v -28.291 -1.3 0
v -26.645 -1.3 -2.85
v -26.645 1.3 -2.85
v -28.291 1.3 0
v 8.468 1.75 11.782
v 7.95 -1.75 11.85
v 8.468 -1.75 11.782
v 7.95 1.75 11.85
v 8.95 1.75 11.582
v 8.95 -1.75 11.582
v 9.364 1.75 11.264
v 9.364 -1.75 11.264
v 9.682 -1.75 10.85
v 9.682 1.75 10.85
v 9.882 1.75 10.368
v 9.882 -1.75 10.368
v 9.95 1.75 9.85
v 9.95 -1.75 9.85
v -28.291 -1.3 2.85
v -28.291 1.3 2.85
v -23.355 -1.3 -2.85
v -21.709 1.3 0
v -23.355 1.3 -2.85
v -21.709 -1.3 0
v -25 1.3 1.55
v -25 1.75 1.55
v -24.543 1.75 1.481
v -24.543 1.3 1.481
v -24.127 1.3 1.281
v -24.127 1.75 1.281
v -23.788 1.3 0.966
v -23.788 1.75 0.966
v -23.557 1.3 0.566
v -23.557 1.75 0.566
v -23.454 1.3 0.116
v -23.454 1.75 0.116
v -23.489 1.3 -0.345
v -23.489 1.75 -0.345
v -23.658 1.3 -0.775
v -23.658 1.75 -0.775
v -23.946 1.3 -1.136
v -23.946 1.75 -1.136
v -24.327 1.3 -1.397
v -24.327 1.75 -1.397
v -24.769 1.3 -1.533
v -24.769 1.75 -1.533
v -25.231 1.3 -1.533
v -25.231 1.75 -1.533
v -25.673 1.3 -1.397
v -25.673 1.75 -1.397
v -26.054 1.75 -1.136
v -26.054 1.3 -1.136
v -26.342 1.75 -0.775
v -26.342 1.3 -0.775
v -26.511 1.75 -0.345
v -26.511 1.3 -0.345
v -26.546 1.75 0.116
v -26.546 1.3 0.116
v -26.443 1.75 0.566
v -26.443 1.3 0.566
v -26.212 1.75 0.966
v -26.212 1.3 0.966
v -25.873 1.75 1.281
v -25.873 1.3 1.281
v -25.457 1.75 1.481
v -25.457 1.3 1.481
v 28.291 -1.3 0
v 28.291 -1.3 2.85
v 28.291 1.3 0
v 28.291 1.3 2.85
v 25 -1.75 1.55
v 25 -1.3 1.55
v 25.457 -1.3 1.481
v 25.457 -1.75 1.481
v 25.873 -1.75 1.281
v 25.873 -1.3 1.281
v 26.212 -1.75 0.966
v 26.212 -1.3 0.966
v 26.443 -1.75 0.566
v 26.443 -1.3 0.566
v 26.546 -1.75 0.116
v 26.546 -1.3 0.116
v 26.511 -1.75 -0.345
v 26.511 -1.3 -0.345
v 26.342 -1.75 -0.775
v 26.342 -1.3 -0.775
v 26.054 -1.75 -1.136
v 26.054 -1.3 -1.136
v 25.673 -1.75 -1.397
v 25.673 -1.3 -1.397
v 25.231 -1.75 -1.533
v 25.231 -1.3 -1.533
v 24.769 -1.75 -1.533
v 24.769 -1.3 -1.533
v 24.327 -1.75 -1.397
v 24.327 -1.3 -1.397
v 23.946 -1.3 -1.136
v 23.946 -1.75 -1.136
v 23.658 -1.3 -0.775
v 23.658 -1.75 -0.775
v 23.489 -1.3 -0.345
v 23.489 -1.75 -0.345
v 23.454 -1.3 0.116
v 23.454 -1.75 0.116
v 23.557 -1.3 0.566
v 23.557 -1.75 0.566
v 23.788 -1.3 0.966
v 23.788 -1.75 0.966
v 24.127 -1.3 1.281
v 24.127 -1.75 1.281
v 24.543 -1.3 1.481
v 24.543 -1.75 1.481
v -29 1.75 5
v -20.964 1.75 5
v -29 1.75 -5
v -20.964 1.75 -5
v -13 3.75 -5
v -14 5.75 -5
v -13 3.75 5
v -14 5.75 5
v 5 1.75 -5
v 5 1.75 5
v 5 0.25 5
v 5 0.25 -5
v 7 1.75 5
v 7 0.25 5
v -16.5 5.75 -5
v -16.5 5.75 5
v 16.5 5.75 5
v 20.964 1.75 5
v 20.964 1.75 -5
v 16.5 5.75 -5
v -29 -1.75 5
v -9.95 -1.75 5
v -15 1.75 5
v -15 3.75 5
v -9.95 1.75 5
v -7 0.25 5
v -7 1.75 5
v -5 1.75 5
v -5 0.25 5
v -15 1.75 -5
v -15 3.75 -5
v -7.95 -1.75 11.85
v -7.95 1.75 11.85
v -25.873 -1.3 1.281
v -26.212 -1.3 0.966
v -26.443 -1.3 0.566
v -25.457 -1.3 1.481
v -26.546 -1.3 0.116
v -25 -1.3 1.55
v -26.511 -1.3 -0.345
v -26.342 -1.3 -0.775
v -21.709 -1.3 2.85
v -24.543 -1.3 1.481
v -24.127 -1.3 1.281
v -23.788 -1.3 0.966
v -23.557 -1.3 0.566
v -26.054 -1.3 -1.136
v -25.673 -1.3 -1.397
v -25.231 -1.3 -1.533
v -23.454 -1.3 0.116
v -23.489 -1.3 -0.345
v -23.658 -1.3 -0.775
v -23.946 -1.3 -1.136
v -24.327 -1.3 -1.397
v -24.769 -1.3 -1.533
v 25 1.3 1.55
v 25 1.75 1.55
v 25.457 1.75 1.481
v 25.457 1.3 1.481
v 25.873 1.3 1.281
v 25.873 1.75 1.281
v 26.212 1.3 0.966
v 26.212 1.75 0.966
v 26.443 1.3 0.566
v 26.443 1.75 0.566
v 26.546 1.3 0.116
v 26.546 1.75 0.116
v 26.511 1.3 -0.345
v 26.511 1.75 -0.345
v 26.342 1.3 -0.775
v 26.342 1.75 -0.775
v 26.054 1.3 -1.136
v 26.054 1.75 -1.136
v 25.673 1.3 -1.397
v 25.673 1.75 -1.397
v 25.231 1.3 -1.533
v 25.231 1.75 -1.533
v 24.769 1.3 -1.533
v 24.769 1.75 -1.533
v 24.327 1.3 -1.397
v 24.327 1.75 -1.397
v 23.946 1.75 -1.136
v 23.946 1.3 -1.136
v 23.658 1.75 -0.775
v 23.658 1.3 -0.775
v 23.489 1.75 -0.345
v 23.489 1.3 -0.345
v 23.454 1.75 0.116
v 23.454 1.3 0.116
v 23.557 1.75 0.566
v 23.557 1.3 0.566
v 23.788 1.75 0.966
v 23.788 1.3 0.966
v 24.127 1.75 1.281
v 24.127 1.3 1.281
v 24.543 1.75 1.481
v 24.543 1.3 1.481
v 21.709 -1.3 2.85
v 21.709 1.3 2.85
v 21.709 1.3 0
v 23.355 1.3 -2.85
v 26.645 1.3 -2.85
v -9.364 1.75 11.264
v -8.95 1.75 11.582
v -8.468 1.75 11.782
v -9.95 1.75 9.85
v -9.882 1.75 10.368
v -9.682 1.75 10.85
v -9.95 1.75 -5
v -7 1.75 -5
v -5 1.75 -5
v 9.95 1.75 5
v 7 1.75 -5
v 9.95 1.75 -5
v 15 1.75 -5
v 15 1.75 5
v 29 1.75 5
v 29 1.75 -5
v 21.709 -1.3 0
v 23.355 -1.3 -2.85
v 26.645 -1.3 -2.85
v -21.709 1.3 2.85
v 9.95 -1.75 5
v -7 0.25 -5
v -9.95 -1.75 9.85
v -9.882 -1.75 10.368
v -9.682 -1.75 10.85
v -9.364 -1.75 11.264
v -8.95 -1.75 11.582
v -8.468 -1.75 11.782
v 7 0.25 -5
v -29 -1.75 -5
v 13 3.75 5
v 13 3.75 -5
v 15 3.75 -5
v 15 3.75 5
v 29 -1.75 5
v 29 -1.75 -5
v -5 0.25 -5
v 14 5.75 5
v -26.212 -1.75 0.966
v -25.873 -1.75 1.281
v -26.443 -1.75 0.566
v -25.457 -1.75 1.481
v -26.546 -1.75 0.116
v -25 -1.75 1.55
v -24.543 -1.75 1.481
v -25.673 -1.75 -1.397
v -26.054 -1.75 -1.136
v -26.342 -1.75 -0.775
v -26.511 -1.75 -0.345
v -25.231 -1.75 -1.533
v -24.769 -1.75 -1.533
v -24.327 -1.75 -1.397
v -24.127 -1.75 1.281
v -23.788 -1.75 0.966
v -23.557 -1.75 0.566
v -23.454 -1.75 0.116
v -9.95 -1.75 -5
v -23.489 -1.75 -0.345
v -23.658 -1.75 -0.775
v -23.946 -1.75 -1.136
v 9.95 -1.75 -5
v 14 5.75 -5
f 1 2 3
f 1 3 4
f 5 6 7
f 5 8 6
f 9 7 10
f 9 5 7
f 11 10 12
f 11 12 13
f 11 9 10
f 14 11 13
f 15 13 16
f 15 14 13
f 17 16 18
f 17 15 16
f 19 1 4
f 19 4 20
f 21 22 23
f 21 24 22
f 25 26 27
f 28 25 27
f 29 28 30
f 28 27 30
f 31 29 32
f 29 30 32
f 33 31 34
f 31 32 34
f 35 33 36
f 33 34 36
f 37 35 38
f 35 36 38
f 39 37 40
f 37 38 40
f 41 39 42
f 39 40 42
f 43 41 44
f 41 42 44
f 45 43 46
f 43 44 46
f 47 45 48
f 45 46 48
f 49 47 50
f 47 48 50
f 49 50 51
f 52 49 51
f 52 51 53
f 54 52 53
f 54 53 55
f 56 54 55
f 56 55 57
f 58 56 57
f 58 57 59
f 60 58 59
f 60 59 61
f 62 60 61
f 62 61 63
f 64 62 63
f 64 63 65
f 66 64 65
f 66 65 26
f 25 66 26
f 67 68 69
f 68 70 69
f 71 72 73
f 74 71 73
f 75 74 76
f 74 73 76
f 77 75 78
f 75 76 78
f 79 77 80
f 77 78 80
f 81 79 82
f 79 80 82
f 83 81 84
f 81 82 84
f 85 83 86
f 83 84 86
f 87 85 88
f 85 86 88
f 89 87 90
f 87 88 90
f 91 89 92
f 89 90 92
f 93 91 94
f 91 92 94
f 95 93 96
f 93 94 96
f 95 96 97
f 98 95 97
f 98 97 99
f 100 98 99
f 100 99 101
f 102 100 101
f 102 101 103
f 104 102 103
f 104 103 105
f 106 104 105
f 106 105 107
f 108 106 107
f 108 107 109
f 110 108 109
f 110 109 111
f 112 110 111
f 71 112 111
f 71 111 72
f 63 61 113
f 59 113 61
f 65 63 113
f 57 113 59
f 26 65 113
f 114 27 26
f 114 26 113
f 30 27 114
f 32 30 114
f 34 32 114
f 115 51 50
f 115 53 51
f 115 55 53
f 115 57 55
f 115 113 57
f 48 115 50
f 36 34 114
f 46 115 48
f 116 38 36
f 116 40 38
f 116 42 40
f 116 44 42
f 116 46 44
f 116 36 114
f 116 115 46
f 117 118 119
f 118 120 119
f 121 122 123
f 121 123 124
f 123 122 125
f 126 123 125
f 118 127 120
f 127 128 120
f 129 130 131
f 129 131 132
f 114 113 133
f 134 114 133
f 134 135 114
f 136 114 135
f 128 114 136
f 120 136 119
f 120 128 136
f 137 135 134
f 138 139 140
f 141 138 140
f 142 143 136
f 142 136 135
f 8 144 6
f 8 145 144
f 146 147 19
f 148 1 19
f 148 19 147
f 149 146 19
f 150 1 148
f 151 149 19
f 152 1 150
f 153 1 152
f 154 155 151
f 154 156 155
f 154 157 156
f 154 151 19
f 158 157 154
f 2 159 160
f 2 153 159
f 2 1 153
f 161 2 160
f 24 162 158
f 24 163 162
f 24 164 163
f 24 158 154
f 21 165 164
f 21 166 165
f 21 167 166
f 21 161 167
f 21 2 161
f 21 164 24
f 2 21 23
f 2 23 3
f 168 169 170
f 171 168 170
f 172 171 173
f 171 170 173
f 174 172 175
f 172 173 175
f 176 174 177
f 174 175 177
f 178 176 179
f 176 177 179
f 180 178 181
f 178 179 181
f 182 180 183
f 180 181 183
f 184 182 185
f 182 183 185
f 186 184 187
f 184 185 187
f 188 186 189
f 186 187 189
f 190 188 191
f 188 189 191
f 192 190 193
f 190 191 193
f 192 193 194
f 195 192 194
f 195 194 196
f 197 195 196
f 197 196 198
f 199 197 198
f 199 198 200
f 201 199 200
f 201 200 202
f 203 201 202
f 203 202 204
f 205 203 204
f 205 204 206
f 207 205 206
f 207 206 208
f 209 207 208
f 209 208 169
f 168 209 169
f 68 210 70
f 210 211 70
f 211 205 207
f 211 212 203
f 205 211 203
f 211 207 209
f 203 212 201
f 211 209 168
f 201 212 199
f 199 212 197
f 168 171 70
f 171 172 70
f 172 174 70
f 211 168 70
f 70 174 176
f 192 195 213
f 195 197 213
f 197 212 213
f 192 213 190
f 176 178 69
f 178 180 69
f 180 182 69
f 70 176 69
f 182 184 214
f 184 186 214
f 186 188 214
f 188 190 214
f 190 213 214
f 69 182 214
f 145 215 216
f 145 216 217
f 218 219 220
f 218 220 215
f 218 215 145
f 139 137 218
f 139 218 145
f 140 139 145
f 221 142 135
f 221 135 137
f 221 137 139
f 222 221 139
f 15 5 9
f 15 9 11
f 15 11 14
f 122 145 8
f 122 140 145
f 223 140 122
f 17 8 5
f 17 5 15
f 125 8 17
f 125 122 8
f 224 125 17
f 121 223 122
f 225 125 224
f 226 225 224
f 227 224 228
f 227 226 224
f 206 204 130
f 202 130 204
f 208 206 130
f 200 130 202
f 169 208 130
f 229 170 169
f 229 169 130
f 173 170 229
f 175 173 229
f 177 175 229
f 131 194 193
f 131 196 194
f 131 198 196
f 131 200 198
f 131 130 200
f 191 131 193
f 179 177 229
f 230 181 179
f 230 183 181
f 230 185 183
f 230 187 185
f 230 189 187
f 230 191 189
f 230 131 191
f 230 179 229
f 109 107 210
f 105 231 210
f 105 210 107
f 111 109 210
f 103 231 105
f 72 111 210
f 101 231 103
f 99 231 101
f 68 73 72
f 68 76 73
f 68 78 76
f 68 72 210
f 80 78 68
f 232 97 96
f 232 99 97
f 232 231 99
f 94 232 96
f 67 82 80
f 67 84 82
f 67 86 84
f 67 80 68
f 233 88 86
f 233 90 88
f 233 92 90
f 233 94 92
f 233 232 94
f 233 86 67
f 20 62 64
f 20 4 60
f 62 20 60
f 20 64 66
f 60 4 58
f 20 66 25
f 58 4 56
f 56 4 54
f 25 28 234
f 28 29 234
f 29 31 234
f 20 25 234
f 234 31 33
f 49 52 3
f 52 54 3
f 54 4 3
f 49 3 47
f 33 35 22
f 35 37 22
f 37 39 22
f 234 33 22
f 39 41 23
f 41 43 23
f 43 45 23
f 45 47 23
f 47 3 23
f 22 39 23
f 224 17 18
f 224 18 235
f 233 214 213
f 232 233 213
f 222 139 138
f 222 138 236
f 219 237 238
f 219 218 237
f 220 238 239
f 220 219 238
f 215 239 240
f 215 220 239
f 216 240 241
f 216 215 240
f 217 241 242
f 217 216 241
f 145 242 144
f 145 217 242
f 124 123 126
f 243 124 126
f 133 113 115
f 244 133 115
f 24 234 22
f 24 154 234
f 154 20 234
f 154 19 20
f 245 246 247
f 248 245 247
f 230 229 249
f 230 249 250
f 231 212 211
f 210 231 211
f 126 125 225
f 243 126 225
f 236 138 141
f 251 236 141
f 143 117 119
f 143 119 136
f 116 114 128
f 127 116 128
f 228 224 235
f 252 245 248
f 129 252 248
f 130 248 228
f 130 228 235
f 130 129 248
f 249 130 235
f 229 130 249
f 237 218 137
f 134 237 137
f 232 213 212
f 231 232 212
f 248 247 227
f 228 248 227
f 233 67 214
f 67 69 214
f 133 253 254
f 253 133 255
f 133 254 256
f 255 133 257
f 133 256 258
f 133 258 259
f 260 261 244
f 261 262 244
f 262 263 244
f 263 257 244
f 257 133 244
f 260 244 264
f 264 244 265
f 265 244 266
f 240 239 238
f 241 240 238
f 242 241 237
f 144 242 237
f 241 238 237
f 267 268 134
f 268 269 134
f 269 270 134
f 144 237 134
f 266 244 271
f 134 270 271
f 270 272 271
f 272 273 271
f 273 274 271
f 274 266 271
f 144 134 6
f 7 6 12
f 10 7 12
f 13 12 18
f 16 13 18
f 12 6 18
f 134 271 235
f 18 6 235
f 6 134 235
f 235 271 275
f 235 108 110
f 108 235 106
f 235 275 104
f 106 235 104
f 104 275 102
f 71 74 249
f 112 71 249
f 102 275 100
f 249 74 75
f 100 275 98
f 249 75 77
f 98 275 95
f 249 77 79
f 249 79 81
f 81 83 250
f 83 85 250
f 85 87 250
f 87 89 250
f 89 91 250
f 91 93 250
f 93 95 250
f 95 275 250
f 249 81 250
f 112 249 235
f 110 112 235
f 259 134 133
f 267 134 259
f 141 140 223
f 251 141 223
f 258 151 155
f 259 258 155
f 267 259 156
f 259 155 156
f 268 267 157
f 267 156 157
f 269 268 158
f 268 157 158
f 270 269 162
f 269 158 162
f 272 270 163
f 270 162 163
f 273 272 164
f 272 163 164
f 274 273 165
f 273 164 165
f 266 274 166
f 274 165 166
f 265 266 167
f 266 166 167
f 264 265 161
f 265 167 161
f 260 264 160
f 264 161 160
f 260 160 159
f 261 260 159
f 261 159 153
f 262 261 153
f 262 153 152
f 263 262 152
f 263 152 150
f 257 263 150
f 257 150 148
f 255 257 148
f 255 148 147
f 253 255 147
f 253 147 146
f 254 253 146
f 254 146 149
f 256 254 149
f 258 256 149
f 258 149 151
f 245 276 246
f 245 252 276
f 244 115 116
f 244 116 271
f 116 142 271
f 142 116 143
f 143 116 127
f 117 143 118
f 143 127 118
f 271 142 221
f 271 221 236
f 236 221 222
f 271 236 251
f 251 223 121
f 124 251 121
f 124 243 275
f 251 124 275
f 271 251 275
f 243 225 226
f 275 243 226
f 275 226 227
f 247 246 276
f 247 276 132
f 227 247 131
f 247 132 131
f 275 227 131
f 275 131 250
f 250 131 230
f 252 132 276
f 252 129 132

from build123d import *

# Parameters (mm, degrees)
SKETCH1_W           = 58
SKETCH1_H           = 10
BOSS_EXTRUDE1_DEPTH = 1.75
SKETCH2_R           = 1.55
CUT_EXTRUDE1_DEPTH  = 3.5
CUT_EXTRUDE2_DEPTH  = 1.3
SKETCH5_W           = 19.9
SKETCH5_H           = 23.7
BOSS_EXTRUDE2_DEPTH = 1.75
FILLET1_R           = 2
BOSS_EXTRUDE3_DEPTH = 5
SKETCH7_W           = 2
SKETCH7_H           = 10
CUT_EXTRUDE3_DEPTH  = 1.5
SKETCH8_W           = 23.808980199
SKETCH8_H           = 14.934673145
CUT_EXTRUDE4_DEPTH  = 5


with BuildPart() as part:
    # Sketch1 → Boss-Extrude1 (new, symmetric)
    with BuildSketch(Plane(origin=(0, 0, 0), x_dir=(1, 0, 0), z_dir=(0, 1, 0))):
        Rectangle(SKETCH1_W, SKETCH1_H)
    extrude(amount=BOSS_EXTRUDE1_DEPTH, both=True)

    # Sketch2 → Cut-Extrude1 (cut)
    with BuildSketch(Plane(origin=(0, 1.75, 0), x_dir=(1, 0, 0), z_dir=(0, 1, 0))):
        with Locations(Location((-25, 0, 0), (0, 0, 270))):
            Circle(SKETCH2_R)
        with Locations(Location((25, 0, 0), (0, 0, 270))):
            Circle(SKETCH2_R)
    extrude(amount=-CUT_EXTRUDE1_DEPTH, mode=Mode.SUBTRACT)

    # Sketch4 → Cut-Extrude2 (cut, symmetric)
    with BuildSketch(Plane(origin=(0, 0, 0), x_dir=(1, 0, 0), z_dir=(0, 1, 0))):
        Polygon((-28.290896534, 0), (-28.290896534, -2.85), (-26.645448267, -2.85), (-23.354551733, -2.85), (-21.709103466, -2.85), (-21.709103466, 0), (-23.354551733, 2.85), (-26.645448267, 2.85), align=None)
        Polygon((28.290896534, 0), (26.645448267, 2.85), (23.354551733, 2.85), (21.709103466, 0), (21.709103466, -2.85), (23.354551733, -2.85), (26.645448267, -2.85), (28.290896534, -2.85), align=None)
    extrude(amount=CUT_EXTRUDE2_DEPTH, both=True, mode=Mode.SUBTRACT)

    # Sketch5 → Boss-Extrude2 (add, symmetric)
    with BuildSketch(Plane(origin=(0, 0, 0), x_dir=(1, 0, 0), z_dir=(0, 1, 0))):
        Rectangle(SKETCH5_W, SKETCH5_H)
    extrude(amount=BOSS_EXTRUDE2_DEPTH, both=True)

    # Fillet1
    fillet1_edges = [part.edges().sort_by_distance(p)[0] for p in [
        (9.95, 0, 11.85),
        (-9.95, 0, 11.85),
    ]]
    fillet(fillet1_edges, radius=FILLET1_R)

    # Sketch6 → Boss-Extrude3 (add, symmetric)
    with BuildSketch(Plane.XY):
        Polygon((-20.964458506, 1.75), (-16.5, 5.75), (-14, 5.75), (-13, 3.75), (-15, 3.75), (-15, 1.75), align=None)
    boss_extrude3 = extrude(amount=BOSS_EXTRUDE3_DEPTH, both=True)

    # Mirror1: Boss-Extrude3 across plane
    add(boss_extrude3.mirror(Plane(origin=(0, 0, 0), x_dir=(0, 0, 1), z_dir=(1, 0, 0))))

    # Sketch7 → Cut-Extrude3 (cut)
    with BuildSketch(Plane(origin=(0, 1.75, 0), x_dir=(1, 0, 0), z_dir=(0, 1, 0))):
        with Locations((-6, 0)):
            Rectangle(SKETCH7_W, SKETCH7_H)
        with Locations((6, 0)):
            Rectangle(SKETCH7_W, SKETCH7_H)
    extrude(amount=-CUT_EXTRUDE3_DEPTH, mode=Mode.SUBTRACT)

    # Sketch8 → Cut-Extrude4 (cut, symmetric)
    with BuildSketch(Plane(origin=(0, 0, 0), x_dir=(1, 0, 0), z_dir=(0, 1, 0))):
        with Locations((0.433446228, 12.467336573)):
            Rectangle(SKETCH8_W, SKETCH8_H)
    extrude(amount=CUT_EXTRUDE4_DEPTH, both=True, mode=Mode.SUBTRACT)


solid = part.part
